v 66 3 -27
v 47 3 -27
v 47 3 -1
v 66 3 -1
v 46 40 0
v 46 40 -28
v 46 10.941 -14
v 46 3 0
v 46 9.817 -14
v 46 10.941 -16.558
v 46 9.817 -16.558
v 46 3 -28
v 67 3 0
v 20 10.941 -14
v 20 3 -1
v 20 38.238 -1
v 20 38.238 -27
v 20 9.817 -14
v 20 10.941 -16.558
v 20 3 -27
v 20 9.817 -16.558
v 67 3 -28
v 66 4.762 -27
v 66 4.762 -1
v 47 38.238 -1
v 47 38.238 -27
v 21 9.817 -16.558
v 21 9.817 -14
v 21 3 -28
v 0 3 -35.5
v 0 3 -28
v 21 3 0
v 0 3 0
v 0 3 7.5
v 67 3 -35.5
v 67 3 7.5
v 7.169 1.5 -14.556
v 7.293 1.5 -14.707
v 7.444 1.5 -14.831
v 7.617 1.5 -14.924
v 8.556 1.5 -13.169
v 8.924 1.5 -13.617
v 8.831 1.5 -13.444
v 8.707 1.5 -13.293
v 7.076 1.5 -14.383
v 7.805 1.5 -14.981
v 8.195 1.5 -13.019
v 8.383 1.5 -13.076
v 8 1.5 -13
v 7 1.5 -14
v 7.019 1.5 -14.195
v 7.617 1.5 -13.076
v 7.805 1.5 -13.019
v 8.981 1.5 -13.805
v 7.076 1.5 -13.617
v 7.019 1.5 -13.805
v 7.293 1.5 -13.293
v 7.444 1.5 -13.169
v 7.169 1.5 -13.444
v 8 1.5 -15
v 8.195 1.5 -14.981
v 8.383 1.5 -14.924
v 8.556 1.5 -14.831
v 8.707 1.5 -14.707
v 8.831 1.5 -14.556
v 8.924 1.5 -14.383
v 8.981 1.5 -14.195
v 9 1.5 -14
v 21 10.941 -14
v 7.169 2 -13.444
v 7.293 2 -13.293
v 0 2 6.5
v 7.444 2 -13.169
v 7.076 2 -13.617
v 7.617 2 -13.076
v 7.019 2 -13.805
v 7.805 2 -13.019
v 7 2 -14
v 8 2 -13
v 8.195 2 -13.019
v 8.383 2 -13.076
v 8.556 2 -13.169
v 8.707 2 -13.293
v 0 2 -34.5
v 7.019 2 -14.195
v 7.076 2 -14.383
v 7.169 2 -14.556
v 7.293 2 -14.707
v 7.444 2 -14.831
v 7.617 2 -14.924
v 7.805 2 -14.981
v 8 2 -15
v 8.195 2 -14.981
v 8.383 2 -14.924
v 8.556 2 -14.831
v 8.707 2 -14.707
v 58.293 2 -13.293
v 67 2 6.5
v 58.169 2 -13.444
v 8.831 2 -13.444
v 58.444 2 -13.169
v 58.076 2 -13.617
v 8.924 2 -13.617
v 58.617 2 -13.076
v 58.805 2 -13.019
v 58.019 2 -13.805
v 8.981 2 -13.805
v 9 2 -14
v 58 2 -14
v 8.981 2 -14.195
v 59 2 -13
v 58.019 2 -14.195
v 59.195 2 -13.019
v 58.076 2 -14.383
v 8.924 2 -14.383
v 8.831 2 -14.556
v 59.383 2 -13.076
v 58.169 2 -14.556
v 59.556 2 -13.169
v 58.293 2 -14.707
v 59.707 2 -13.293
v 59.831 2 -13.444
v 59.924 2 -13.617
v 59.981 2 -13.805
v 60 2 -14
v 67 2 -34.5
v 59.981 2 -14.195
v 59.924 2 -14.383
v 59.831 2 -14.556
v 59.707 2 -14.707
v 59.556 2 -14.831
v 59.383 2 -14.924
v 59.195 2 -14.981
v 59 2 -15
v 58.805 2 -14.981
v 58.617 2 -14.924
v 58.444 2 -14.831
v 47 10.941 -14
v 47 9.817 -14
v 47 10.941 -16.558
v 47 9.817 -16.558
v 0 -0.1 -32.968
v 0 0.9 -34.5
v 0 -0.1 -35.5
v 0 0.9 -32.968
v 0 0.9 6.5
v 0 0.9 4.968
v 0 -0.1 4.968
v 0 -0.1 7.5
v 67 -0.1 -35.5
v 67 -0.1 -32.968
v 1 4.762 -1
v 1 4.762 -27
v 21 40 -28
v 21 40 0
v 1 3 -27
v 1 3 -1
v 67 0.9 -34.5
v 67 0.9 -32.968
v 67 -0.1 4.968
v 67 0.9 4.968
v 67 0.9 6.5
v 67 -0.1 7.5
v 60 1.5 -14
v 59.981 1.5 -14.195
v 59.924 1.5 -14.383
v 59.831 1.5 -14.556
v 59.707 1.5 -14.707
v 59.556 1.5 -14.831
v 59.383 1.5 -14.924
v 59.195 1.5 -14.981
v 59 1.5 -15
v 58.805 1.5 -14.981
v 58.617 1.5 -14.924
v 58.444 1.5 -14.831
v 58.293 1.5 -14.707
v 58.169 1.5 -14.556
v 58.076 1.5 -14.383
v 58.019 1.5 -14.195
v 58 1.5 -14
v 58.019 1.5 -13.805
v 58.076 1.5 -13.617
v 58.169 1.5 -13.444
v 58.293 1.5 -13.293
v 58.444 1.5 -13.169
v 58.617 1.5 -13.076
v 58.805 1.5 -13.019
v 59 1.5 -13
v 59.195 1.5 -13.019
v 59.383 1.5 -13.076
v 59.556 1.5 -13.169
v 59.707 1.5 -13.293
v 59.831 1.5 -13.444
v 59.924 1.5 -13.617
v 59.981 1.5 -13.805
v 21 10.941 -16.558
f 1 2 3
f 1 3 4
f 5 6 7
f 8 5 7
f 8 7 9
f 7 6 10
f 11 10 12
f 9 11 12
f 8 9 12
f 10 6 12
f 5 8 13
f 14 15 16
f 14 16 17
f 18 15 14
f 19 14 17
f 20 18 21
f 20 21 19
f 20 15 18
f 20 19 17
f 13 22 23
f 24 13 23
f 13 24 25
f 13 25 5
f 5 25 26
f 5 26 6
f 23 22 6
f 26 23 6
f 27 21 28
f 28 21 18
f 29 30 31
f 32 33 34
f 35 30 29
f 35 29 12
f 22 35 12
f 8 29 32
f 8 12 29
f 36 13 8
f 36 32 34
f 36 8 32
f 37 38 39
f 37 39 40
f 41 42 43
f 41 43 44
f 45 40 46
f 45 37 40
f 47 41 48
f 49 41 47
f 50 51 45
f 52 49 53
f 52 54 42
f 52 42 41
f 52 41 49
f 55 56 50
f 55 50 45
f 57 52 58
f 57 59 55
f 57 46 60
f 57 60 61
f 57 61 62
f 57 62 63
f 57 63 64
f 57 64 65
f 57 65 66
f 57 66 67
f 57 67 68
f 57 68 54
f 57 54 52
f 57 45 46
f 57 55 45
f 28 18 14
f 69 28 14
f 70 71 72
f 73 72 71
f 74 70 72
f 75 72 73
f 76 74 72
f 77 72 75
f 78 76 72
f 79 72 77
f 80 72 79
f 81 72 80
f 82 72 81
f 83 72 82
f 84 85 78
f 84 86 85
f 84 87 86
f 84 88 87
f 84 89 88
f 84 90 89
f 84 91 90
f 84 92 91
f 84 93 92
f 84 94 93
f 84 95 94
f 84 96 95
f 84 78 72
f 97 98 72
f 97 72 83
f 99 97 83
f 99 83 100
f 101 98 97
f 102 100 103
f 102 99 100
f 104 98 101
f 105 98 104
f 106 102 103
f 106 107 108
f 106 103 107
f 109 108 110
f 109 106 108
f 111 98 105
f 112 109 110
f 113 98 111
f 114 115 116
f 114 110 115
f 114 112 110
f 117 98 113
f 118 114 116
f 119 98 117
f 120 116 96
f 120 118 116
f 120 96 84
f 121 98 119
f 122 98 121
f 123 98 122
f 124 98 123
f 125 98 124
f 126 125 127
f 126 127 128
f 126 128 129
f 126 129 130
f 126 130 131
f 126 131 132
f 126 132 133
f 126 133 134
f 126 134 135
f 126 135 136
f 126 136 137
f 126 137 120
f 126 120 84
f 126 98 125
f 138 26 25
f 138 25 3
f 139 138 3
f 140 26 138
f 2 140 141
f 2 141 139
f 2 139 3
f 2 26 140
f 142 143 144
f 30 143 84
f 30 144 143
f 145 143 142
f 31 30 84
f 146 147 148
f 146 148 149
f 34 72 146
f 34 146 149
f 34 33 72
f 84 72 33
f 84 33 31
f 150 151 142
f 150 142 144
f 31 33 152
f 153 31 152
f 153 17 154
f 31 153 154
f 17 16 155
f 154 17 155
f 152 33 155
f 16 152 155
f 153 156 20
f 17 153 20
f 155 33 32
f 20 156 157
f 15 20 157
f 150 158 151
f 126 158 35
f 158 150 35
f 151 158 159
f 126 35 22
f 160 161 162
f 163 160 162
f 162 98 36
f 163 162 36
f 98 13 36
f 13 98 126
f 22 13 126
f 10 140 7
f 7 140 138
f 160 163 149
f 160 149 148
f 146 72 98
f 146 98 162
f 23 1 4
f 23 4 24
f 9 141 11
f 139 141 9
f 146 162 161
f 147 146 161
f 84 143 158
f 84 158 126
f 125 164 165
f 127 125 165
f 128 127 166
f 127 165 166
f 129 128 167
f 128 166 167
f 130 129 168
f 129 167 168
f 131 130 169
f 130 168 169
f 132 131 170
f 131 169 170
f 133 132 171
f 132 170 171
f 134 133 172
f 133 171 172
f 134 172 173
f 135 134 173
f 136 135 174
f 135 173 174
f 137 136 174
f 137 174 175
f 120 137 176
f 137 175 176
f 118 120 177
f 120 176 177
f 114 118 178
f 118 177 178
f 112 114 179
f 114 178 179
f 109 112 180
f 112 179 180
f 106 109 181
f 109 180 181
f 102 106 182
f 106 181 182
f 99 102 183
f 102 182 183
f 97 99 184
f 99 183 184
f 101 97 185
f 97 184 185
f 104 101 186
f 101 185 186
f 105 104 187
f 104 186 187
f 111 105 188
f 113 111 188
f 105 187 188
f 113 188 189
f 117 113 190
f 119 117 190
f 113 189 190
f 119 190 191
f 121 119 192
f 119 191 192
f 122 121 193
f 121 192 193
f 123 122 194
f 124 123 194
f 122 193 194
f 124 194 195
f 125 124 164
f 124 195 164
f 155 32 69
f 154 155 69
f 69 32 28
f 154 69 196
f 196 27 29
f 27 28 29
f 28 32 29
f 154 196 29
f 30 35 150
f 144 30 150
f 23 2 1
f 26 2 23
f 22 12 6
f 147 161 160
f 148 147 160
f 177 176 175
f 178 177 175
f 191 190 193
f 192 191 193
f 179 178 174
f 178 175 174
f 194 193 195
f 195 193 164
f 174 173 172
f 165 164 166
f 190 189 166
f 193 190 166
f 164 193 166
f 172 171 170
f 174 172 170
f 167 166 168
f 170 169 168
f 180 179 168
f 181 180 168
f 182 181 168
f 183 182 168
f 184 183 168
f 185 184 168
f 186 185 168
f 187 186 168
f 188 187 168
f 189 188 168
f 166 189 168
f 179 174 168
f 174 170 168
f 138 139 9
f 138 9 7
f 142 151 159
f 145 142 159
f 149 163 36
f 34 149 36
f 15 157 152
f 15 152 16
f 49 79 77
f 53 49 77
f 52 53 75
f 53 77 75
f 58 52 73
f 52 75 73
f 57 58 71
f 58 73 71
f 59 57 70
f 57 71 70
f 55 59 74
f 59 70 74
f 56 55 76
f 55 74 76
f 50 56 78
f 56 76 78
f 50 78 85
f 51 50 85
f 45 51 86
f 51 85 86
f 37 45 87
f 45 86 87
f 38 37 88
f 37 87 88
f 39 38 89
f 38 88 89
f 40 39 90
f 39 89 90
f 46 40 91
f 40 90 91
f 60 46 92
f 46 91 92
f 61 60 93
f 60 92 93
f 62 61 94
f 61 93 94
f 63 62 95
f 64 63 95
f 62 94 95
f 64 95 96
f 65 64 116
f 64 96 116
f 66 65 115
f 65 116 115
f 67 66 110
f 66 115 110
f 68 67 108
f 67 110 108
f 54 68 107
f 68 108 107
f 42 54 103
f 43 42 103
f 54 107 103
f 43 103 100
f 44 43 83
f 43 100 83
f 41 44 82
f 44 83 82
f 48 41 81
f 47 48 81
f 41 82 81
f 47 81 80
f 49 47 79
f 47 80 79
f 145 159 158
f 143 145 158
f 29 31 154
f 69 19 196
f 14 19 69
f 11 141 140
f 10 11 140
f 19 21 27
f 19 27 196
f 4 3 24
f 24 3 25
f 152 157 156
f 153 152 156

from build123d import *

# Parameters (mm, degrees)
SKETCH1_W           = 21
SKETCH1_H           = 28
BOSS_EXTRUDE1_DEPTH = 3
SKETCH2_W           = 21
SKETCH2_H           = 28
BOSS_EXTRUDE2_DEPTH = 37
CUT_EXTRUDE1_REACH  = 55.151
SHELL1_T            = -1
BOSS_EXTRUDE3_DEPTH = 33.5
SKETCH9_W           = 21
SKETCH9_H           = 28
CUT_EXTRUDE2_DEPTH  = 2
SKETCH10_R          = 1
BOSS_EXTRUDE4_DEPTH = 0.5
CUT_EXTRUDE3_REACH  = 59.099
SKETCH11_W          = 2.558101437
SKETCH11_H          = 1.124051106
MIRROR5_START       = -28
MIRROR5_DEPTH       = 28
MIRROR5_START_2     = 1.5
MIRROR5_2_OUTLINE_R = 1
MIRROR5_2_DEPTH     = 0.5
SHELL3_START        = -27
SHELL3_DEPTH        = 26


# Read off the part's stored shape, not the designer's step: Mirror5, Shell3
with BuildPart() as part:
    # Sketch1 → Boss-Extrude1 (new body)
    with BuildSketch(Plane(origin=(0, 0, 0), x_dir=(1, 0, 0), z_dir=(0, 1, 0))):
        with Locations((10.5, 14)):
            Rectangle(SKETCH1_W, SKETCH1_H)
    extrude(amount=BOSS_EXTRUDE1_DEPTH)

    # Sketch2 → Boss-Extrude2 (add)
    with BuildSketch(Plane(origin=(0, 3, 0), x_dir=(1, 0, 0), z_dir=(0, 1, 0))):
        with Locations((10.5, 14)):
            Rectangle(SKETCH2_W, SKETCH2_H)
    extrude(amount=BOSS_EXTRUDE2_DEPTH)

    # Sketch3 → Cut-Extrude1 (cut, up to next)
    with BuildSketch(Plane.XY, mode=Mode.PRIVATE) as cut_extrude1_sk1:
        Polygon((0, 3), (21, 40), (0, 40), align=None)
    cut_extrude1_tool1 = extrude(cut_extrude1_sk1.sketch, amount=-CUT_EXTRUDE1_REACH, mode=Mode.PRIVATE) & part.part
    add(cut_extrude1_tool1.solids().sort_by_distance((7, 27.666667, 0))[0], mode=Mode.SUBTRACT)

    # Shell1
    shell1_openings = [part.faces().sort_by_distance(p)[0] for p in [
        (10.5, 21.5, -14),
    ]]
    offset(amount=SHELL1_T, openings=shell1_openings, kind=Kind.INTERSECTION)

    # Sketch7 → Boss-Extrude3 (add)
    with BuildSketch(Plane(origin=(0, 0, 0), x_dir=(0, 0, -1), z_dir=(1, 0, 0))):
        Polygon((34, -0.1), (32.967936428, -0.1), (32.967936428, 0.9), (34.5, 0.9), (34.5, 2), (29.5, 2), (-1.5, 2), (-6.5, 2), (-6.5, 0.9), (-4.967936428, 0.9), (-4.967936428, -0.1), (-6, -0.1), (-7.5, -0.1), (-7.5, 3), (-1.5, 3), (29.5, 3), (35.5, 3), (35.5, -0.1), align=None)
    boss_extrude3 = extrude(amount=BOSS_EXTRUDE3_DEPTH)

    # Sketch9 → Cut-Extrude2 (cut)
    with BuildSketch(Plane.XZ):
        with Locations((10.5, -14)):
            Rectangle(SKETCH9_W, SKETCH9_H)
    extrude(amount=-CUT_EXTRUDE2_DEPTH, mode=Mode.SUBTRACT)

    # Sketch10 → Boss-Extrude4 (add)
    with BuildSketch(Plane.XZ.offset(-2)):
        with Locations(Location((8, -14, 0), (0, 0, 90))):
            Circle(SKETCH10_R)
    extrude(amount=BOSS_EXTRUDE4_DEPTH)

    # Sketch11 → Cut-Extrude3 (cut, up to next)
    with BuildSketch(Plane.ZY.offset(-20), mode=Mode.PRIVATE) as cut_extrude3_sk1:
        with Locations((-15.279050719, 10.379008518)):
            Rectangle(SKETCH11_W, SKETCH11_H)
    cut_extrude3_tool1 = extrude(cut_extrude3_sk1.sketch, amount=-CUT_EXTRUDE3_REACH, mode=Mode.PRIVATE) & part.part
    cut_extrude3 = cut_extrude3_tool1.solids().sort_by_distance((20, 10.379009, -15.279051))[0]
    add(cut_extrude3, mode=Mode.SUBTRACT)

    # Mirror4: Boss-Extrude3 across plane
    add(boss_extrude3.mirror(Plane(origin=(33.5, 0, 0), x_dir=(0, 0, 1), z_dir=(1, 0, 0))))

    # Mirror5 outline → Mirror5 (add)
    with BuildSketch(Plane.XY.offset(MIRROR5_START)):
        Polygon((67, 3), (46, 40), (46, 3), align=None)
    extrude(amount=MIRROR5_DEPTH)

    # Mirror5 2 outline → Mirror5 2 (add)
    with BuildSketch(Plane(origin=(0, 0, 0), x_dir=(1, 0, 0), z_dir=(0, 1, 0)).offset(MIRROR5_START_2)):
        with Locations((59, 14)):
            Circle(MIRROR5_2_OUTLINE_R)
    extrude(amount=MIRROR5_2_DEPTH)

    # Shell3 outline → Shell3 (cut)
    with BuildSketch(Plane.XY.offset(SHELL3_START)):
        Polygon((47, 3), (66, 3), (66, 4.761904762), (47, 38.238095238), align=None)
    extrude(amount=SHELL3_DEPTH, mode=Mode.SUBTRACT)

    # Mirror6: Cut-Extrude3 across plane
    add(cut_extrude3.mirror(Plane(origin=(33.5, 0, 0), x_dir=(0, 0, 1), z_dir=(1, 0, 0))), mode=Mode.SUBTRACT)


solid = part.part
